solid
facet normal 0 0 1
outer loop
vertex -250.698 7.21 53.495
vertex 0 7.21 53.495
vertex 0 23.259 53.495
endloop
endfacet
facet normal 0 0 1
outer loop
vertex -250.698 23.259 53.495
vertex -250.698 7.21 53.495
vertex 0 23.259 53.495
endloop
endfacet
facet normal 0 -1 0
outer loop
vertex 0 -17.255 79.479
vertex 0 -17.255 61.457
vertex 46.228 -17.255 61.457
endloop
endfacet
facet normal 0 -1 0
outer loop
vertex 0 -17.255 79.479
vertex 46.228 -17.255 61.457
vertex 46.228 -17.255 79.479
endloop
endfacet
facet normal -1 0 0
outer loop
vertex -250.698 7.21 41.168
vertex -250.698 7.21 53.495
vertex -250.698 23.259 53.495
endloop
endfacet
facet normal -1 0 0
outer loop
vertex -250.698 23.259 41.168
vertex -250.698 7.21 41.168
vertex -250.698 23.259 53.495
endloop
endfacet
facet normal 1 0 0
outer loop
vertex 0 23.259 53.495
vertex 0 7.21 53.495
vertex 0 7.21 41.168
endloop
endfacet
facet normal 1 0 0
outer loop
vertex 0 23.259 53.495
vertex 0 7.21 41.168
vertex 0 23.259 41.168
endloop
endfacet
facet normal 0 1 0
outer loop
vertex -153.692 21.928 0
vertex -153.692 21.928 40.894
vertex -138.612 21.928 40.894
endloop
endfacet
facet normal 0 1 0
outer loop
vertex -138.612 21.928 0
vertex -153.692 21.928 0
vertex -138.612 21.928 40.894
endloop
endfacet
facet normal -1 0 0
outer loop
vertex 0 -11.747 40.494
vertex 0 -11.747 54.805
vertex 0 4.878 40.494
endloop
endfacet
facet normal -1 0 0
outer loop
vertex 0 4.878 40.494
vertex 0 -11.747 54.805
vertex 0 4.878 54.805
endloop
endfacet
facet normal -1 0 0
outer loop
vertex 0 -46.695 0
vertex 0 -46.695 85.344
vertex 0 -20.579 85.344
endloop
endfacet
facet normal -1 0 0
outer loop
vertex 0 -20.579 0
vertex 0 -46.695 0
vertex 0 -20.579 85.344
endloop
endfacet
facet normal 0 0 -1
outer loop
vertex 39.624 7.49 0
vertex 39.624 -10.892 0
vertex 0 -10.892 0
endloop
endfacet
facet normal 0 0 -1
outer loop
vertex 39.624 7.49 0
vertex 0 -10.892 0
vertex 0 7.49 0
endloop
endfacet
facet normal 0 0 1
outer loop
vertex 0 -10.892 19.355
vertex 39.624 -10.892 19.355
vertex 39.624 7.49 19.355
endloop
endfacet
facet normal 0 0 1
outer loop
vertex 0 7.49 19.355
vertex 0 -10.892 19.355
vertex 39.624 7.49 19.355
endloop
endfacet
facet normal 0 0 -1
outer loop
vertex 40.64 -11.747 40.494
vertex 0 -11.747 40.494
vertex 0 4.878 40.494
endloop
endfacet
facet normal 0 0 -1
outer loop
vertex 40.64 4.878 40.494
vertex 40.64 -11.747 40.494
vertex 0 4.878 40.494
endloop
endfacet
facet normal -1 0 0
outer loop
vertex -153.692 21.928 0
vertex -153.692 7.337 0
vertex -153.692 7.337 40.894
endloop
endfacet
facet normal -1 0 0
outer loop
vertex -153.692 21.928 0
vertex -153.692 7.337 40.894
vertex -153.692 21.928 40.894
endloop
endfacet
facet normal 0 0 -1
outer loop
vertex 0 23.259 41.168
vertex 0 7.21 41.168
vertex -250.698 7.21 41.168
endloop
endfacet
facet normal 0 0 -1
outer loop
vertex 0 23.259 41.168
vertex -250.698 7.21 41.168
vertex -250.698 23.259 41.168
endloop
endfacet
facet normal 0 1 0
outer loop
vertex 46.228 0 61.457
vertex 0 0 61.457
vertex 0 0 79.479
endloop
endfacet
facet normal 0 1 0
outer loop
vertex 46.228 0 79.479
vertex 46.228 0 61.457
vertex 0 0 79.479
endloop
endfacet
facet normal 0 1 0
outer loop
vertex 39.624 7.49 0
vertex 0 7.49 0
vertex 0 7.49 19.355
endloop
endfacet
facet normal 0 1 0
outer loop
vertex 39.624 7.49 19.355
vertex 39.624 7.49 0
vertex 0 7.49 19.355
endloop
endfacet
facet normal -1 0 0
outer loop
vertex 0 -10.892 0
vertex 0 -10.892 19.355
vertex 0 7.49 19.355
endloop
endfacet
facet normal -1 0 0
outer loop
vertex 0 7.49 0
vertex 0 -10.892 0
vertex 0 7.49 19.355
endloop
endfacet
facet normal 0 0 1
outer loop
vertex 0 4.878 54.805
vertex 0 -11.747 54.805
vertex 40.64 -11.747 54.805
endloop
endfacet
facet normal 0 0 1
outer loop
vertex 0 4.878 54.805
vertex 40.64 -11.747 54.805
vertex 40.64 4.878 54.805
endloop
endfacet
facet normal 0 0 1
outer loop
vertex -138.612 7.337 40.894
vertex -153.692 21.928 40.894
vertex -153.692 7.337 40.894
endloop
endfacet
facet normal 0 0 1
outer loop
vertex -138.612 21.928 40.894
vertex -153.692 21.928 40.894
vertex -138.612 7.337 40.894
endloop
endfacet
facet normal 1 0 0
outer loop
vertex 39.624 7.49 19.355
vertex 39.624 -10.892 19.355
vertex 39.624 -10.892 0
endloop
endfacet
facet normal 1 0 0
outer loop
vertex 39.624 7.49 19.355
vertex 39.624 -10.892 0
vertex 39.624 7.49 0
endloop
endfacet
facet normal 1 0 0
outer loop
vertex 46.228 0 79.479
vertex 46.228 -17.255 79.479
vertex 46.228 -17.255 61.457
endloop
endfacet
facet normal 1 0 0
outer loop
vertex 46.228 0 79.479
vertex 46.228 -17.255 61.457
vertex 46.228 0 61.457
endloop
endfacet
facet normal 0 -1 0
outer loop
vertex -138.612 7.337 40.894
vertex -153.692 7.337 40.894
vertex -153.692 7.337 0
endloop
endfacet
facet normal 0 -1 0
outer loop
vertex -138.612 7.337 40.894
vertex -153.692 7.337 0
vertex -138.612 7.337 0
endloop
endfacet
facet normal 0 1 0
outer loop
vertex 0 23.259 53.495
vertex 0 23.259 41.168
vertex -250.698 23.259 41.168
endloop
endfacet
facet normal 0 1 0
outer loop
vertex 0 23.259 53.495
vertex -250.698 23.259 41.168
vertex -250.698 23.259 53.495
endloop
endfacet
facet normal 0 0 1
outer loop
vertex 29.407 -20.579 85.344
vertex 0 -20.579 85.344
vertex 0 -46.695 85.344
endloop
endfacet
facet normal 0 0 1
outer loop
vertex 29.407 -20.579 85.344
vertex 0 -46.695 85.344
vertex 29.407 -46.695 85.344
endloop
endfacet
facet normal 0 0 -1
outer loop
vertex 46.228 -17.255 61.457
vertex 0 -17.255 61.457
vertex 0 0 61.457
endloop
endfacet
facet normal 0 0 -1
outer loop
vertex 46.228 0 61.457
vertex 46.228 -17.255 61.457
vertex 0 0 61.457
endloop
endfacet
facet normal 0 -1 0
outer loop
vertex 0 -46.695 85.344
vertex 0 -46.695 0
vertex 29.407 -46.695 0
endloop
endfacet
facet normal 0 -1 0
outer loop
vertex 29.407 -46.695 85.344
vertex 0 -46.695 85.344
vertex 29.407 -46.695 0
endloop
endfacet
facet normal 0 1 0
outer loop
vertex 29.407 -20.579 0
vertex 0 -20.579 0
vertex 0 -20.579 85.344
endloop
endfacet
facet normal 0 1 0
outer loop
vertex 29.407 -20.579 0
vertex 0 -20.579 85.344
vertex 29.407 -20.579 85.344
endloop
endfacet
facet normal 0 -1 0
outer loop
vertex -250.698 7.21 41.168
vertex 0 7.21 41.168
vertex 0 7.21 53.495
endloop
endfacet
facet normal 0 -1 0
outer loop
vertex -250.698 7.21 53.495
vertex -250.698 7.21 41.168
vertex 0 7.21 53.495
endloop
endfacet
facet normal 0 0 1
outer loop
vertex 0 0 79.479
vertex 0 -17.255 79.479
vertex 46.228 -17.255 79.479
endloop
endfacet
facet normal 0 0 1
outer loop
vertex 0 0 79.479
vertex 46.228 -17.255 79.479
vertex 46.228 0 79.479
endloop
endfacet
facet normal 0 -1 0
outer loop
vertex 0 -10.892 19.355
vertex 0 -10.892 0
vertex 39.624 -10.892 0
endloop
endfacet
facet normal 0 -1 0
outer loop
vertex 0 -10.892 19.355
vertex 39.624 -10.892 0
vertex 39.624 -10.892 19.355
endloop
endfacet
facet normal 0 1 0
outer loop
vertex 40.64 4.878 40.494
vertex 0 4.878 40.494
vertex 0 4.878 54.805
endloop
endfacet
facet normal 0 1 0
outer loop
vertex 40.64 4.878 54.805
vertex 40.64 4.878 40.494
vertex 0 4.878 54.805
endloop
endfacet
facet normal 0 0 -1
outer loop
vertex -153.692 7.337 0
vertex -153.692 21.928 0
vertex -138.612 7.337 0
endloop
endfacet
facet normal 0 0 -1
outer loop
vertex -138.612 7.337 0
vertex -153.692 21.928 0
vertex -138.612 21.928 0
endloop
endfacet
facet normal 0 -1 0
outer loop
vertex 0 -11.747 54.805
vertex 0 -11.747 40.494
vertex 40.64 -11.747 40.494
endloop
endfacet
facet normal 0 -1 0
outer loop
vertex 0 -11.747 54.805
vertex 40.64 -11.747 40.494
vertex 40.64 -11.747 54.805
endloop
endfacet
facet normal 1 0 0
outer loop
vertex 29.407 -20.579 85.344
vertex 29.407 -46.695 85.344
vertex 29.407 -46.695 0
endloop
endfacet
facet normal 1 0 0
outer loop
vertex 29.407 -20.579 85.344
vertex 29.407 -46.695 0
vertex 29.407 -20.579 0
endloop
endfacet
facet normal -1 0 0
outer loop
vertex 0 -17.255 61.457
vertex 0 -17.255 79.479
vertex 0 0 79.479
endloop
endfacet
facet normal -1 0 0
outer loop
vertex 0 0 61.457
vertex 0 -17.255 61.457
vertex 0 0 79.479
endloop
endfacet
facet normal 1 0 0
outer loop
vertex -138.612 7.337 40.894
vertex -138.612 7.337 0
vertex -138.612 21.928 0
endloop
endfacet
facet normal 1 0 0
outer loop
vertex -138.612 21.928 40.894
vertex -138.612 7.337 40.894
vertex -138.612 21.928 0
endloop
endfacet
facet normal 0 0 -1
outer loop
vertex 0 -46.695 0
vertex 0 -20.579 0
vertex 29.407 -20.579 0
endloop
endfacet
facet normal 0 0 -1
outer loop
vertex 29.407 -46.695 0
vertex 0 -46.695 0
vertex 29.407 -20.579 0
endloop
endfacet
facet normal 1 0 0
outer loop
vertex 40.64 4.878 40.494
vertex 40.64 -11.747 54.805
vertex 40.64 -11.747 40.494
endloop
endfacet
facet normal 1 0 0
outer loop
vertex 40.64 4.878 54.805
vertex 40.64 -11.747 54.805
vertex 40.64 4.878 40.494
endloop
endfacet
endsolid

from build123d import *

# Parameters (mm, degrees)
F0_W      = 15.080273
F0_H      = 14.590676
F1_DEPTH  = 40.894
F2_W      = 16.048514
F2_H      = 12.327124
F3_DEPTH  = 250.698
F4_W      = 29.407218
F4_H      = 26.116371
F5_DEPTH  = 85.344
F6_W      = 16.624396
F6_H      = 14.311012
F7_DEPTH  = 40.64
F8_W      = 17.255321
F8_H      = 18.021867
F9_DEPTH  = 46.228
F10_W     = 18.382177
F10_H     = 19.354627
F11_DEPTH = 39.624


with BuildPart() as f1:
    # F0 (on Top) → F1 (new body)
    with BuildSketch(Plane.XY):
        with Locations((-146.151781, 14.632687)):
            Rectangle(F0_W, F0_H)
    extrude(amount=F1_DEPTH)


with BuildPart() as f3:
    # F2 (on Right) → F3 (new body)
    with BuildSketch(Plane.YZ):
        with Locations((15.234463, 47.331499)):
            Rectangle(F2_W, F2_H)
    extrude(amount=-F3_DEPTH)


with BuildPart() as f5:
    # F4 (on Top) → F5 (new body)
    with BuildSketch(Plane.XY):
        with Locations((14.703609, -33.637046)):
            Rectangle(F4_W, F4_H)
    extrude(amount=F5_DEPTH)


with BuildPart() as f7:
    # F6 (on Right) → F7 (new body)
    with BuildSketch(Plane.YZ):
        with Locations((-3.434348, 47.649315)):
            Rectangle(F6_W, F6_H)
    extrude(amount=F7_DEPTH)


with BuildPart() as f9:
    # F8 (on Right) → F9 (new body)
    with BuildSketch(Plane.YZ):
        with Locations((-8.62766, 70.467807)):
            Rectangle(F8_W, F8_H)
    extrude(amount=F9_DEPTH)


with BuildPart() as f11:
    # F10 (on Right) → F11 (new body)
    with BuildSketch(Plane.YZ):
        with Locations((-1.701184, 9.677314)):
            Rectangle(F10_W, F10_H)
    extrude(amount=F11_DEPTH)


solid = Compound([f1.part, f3.part, f5.part, f7.part, f9.part, f11.part])
